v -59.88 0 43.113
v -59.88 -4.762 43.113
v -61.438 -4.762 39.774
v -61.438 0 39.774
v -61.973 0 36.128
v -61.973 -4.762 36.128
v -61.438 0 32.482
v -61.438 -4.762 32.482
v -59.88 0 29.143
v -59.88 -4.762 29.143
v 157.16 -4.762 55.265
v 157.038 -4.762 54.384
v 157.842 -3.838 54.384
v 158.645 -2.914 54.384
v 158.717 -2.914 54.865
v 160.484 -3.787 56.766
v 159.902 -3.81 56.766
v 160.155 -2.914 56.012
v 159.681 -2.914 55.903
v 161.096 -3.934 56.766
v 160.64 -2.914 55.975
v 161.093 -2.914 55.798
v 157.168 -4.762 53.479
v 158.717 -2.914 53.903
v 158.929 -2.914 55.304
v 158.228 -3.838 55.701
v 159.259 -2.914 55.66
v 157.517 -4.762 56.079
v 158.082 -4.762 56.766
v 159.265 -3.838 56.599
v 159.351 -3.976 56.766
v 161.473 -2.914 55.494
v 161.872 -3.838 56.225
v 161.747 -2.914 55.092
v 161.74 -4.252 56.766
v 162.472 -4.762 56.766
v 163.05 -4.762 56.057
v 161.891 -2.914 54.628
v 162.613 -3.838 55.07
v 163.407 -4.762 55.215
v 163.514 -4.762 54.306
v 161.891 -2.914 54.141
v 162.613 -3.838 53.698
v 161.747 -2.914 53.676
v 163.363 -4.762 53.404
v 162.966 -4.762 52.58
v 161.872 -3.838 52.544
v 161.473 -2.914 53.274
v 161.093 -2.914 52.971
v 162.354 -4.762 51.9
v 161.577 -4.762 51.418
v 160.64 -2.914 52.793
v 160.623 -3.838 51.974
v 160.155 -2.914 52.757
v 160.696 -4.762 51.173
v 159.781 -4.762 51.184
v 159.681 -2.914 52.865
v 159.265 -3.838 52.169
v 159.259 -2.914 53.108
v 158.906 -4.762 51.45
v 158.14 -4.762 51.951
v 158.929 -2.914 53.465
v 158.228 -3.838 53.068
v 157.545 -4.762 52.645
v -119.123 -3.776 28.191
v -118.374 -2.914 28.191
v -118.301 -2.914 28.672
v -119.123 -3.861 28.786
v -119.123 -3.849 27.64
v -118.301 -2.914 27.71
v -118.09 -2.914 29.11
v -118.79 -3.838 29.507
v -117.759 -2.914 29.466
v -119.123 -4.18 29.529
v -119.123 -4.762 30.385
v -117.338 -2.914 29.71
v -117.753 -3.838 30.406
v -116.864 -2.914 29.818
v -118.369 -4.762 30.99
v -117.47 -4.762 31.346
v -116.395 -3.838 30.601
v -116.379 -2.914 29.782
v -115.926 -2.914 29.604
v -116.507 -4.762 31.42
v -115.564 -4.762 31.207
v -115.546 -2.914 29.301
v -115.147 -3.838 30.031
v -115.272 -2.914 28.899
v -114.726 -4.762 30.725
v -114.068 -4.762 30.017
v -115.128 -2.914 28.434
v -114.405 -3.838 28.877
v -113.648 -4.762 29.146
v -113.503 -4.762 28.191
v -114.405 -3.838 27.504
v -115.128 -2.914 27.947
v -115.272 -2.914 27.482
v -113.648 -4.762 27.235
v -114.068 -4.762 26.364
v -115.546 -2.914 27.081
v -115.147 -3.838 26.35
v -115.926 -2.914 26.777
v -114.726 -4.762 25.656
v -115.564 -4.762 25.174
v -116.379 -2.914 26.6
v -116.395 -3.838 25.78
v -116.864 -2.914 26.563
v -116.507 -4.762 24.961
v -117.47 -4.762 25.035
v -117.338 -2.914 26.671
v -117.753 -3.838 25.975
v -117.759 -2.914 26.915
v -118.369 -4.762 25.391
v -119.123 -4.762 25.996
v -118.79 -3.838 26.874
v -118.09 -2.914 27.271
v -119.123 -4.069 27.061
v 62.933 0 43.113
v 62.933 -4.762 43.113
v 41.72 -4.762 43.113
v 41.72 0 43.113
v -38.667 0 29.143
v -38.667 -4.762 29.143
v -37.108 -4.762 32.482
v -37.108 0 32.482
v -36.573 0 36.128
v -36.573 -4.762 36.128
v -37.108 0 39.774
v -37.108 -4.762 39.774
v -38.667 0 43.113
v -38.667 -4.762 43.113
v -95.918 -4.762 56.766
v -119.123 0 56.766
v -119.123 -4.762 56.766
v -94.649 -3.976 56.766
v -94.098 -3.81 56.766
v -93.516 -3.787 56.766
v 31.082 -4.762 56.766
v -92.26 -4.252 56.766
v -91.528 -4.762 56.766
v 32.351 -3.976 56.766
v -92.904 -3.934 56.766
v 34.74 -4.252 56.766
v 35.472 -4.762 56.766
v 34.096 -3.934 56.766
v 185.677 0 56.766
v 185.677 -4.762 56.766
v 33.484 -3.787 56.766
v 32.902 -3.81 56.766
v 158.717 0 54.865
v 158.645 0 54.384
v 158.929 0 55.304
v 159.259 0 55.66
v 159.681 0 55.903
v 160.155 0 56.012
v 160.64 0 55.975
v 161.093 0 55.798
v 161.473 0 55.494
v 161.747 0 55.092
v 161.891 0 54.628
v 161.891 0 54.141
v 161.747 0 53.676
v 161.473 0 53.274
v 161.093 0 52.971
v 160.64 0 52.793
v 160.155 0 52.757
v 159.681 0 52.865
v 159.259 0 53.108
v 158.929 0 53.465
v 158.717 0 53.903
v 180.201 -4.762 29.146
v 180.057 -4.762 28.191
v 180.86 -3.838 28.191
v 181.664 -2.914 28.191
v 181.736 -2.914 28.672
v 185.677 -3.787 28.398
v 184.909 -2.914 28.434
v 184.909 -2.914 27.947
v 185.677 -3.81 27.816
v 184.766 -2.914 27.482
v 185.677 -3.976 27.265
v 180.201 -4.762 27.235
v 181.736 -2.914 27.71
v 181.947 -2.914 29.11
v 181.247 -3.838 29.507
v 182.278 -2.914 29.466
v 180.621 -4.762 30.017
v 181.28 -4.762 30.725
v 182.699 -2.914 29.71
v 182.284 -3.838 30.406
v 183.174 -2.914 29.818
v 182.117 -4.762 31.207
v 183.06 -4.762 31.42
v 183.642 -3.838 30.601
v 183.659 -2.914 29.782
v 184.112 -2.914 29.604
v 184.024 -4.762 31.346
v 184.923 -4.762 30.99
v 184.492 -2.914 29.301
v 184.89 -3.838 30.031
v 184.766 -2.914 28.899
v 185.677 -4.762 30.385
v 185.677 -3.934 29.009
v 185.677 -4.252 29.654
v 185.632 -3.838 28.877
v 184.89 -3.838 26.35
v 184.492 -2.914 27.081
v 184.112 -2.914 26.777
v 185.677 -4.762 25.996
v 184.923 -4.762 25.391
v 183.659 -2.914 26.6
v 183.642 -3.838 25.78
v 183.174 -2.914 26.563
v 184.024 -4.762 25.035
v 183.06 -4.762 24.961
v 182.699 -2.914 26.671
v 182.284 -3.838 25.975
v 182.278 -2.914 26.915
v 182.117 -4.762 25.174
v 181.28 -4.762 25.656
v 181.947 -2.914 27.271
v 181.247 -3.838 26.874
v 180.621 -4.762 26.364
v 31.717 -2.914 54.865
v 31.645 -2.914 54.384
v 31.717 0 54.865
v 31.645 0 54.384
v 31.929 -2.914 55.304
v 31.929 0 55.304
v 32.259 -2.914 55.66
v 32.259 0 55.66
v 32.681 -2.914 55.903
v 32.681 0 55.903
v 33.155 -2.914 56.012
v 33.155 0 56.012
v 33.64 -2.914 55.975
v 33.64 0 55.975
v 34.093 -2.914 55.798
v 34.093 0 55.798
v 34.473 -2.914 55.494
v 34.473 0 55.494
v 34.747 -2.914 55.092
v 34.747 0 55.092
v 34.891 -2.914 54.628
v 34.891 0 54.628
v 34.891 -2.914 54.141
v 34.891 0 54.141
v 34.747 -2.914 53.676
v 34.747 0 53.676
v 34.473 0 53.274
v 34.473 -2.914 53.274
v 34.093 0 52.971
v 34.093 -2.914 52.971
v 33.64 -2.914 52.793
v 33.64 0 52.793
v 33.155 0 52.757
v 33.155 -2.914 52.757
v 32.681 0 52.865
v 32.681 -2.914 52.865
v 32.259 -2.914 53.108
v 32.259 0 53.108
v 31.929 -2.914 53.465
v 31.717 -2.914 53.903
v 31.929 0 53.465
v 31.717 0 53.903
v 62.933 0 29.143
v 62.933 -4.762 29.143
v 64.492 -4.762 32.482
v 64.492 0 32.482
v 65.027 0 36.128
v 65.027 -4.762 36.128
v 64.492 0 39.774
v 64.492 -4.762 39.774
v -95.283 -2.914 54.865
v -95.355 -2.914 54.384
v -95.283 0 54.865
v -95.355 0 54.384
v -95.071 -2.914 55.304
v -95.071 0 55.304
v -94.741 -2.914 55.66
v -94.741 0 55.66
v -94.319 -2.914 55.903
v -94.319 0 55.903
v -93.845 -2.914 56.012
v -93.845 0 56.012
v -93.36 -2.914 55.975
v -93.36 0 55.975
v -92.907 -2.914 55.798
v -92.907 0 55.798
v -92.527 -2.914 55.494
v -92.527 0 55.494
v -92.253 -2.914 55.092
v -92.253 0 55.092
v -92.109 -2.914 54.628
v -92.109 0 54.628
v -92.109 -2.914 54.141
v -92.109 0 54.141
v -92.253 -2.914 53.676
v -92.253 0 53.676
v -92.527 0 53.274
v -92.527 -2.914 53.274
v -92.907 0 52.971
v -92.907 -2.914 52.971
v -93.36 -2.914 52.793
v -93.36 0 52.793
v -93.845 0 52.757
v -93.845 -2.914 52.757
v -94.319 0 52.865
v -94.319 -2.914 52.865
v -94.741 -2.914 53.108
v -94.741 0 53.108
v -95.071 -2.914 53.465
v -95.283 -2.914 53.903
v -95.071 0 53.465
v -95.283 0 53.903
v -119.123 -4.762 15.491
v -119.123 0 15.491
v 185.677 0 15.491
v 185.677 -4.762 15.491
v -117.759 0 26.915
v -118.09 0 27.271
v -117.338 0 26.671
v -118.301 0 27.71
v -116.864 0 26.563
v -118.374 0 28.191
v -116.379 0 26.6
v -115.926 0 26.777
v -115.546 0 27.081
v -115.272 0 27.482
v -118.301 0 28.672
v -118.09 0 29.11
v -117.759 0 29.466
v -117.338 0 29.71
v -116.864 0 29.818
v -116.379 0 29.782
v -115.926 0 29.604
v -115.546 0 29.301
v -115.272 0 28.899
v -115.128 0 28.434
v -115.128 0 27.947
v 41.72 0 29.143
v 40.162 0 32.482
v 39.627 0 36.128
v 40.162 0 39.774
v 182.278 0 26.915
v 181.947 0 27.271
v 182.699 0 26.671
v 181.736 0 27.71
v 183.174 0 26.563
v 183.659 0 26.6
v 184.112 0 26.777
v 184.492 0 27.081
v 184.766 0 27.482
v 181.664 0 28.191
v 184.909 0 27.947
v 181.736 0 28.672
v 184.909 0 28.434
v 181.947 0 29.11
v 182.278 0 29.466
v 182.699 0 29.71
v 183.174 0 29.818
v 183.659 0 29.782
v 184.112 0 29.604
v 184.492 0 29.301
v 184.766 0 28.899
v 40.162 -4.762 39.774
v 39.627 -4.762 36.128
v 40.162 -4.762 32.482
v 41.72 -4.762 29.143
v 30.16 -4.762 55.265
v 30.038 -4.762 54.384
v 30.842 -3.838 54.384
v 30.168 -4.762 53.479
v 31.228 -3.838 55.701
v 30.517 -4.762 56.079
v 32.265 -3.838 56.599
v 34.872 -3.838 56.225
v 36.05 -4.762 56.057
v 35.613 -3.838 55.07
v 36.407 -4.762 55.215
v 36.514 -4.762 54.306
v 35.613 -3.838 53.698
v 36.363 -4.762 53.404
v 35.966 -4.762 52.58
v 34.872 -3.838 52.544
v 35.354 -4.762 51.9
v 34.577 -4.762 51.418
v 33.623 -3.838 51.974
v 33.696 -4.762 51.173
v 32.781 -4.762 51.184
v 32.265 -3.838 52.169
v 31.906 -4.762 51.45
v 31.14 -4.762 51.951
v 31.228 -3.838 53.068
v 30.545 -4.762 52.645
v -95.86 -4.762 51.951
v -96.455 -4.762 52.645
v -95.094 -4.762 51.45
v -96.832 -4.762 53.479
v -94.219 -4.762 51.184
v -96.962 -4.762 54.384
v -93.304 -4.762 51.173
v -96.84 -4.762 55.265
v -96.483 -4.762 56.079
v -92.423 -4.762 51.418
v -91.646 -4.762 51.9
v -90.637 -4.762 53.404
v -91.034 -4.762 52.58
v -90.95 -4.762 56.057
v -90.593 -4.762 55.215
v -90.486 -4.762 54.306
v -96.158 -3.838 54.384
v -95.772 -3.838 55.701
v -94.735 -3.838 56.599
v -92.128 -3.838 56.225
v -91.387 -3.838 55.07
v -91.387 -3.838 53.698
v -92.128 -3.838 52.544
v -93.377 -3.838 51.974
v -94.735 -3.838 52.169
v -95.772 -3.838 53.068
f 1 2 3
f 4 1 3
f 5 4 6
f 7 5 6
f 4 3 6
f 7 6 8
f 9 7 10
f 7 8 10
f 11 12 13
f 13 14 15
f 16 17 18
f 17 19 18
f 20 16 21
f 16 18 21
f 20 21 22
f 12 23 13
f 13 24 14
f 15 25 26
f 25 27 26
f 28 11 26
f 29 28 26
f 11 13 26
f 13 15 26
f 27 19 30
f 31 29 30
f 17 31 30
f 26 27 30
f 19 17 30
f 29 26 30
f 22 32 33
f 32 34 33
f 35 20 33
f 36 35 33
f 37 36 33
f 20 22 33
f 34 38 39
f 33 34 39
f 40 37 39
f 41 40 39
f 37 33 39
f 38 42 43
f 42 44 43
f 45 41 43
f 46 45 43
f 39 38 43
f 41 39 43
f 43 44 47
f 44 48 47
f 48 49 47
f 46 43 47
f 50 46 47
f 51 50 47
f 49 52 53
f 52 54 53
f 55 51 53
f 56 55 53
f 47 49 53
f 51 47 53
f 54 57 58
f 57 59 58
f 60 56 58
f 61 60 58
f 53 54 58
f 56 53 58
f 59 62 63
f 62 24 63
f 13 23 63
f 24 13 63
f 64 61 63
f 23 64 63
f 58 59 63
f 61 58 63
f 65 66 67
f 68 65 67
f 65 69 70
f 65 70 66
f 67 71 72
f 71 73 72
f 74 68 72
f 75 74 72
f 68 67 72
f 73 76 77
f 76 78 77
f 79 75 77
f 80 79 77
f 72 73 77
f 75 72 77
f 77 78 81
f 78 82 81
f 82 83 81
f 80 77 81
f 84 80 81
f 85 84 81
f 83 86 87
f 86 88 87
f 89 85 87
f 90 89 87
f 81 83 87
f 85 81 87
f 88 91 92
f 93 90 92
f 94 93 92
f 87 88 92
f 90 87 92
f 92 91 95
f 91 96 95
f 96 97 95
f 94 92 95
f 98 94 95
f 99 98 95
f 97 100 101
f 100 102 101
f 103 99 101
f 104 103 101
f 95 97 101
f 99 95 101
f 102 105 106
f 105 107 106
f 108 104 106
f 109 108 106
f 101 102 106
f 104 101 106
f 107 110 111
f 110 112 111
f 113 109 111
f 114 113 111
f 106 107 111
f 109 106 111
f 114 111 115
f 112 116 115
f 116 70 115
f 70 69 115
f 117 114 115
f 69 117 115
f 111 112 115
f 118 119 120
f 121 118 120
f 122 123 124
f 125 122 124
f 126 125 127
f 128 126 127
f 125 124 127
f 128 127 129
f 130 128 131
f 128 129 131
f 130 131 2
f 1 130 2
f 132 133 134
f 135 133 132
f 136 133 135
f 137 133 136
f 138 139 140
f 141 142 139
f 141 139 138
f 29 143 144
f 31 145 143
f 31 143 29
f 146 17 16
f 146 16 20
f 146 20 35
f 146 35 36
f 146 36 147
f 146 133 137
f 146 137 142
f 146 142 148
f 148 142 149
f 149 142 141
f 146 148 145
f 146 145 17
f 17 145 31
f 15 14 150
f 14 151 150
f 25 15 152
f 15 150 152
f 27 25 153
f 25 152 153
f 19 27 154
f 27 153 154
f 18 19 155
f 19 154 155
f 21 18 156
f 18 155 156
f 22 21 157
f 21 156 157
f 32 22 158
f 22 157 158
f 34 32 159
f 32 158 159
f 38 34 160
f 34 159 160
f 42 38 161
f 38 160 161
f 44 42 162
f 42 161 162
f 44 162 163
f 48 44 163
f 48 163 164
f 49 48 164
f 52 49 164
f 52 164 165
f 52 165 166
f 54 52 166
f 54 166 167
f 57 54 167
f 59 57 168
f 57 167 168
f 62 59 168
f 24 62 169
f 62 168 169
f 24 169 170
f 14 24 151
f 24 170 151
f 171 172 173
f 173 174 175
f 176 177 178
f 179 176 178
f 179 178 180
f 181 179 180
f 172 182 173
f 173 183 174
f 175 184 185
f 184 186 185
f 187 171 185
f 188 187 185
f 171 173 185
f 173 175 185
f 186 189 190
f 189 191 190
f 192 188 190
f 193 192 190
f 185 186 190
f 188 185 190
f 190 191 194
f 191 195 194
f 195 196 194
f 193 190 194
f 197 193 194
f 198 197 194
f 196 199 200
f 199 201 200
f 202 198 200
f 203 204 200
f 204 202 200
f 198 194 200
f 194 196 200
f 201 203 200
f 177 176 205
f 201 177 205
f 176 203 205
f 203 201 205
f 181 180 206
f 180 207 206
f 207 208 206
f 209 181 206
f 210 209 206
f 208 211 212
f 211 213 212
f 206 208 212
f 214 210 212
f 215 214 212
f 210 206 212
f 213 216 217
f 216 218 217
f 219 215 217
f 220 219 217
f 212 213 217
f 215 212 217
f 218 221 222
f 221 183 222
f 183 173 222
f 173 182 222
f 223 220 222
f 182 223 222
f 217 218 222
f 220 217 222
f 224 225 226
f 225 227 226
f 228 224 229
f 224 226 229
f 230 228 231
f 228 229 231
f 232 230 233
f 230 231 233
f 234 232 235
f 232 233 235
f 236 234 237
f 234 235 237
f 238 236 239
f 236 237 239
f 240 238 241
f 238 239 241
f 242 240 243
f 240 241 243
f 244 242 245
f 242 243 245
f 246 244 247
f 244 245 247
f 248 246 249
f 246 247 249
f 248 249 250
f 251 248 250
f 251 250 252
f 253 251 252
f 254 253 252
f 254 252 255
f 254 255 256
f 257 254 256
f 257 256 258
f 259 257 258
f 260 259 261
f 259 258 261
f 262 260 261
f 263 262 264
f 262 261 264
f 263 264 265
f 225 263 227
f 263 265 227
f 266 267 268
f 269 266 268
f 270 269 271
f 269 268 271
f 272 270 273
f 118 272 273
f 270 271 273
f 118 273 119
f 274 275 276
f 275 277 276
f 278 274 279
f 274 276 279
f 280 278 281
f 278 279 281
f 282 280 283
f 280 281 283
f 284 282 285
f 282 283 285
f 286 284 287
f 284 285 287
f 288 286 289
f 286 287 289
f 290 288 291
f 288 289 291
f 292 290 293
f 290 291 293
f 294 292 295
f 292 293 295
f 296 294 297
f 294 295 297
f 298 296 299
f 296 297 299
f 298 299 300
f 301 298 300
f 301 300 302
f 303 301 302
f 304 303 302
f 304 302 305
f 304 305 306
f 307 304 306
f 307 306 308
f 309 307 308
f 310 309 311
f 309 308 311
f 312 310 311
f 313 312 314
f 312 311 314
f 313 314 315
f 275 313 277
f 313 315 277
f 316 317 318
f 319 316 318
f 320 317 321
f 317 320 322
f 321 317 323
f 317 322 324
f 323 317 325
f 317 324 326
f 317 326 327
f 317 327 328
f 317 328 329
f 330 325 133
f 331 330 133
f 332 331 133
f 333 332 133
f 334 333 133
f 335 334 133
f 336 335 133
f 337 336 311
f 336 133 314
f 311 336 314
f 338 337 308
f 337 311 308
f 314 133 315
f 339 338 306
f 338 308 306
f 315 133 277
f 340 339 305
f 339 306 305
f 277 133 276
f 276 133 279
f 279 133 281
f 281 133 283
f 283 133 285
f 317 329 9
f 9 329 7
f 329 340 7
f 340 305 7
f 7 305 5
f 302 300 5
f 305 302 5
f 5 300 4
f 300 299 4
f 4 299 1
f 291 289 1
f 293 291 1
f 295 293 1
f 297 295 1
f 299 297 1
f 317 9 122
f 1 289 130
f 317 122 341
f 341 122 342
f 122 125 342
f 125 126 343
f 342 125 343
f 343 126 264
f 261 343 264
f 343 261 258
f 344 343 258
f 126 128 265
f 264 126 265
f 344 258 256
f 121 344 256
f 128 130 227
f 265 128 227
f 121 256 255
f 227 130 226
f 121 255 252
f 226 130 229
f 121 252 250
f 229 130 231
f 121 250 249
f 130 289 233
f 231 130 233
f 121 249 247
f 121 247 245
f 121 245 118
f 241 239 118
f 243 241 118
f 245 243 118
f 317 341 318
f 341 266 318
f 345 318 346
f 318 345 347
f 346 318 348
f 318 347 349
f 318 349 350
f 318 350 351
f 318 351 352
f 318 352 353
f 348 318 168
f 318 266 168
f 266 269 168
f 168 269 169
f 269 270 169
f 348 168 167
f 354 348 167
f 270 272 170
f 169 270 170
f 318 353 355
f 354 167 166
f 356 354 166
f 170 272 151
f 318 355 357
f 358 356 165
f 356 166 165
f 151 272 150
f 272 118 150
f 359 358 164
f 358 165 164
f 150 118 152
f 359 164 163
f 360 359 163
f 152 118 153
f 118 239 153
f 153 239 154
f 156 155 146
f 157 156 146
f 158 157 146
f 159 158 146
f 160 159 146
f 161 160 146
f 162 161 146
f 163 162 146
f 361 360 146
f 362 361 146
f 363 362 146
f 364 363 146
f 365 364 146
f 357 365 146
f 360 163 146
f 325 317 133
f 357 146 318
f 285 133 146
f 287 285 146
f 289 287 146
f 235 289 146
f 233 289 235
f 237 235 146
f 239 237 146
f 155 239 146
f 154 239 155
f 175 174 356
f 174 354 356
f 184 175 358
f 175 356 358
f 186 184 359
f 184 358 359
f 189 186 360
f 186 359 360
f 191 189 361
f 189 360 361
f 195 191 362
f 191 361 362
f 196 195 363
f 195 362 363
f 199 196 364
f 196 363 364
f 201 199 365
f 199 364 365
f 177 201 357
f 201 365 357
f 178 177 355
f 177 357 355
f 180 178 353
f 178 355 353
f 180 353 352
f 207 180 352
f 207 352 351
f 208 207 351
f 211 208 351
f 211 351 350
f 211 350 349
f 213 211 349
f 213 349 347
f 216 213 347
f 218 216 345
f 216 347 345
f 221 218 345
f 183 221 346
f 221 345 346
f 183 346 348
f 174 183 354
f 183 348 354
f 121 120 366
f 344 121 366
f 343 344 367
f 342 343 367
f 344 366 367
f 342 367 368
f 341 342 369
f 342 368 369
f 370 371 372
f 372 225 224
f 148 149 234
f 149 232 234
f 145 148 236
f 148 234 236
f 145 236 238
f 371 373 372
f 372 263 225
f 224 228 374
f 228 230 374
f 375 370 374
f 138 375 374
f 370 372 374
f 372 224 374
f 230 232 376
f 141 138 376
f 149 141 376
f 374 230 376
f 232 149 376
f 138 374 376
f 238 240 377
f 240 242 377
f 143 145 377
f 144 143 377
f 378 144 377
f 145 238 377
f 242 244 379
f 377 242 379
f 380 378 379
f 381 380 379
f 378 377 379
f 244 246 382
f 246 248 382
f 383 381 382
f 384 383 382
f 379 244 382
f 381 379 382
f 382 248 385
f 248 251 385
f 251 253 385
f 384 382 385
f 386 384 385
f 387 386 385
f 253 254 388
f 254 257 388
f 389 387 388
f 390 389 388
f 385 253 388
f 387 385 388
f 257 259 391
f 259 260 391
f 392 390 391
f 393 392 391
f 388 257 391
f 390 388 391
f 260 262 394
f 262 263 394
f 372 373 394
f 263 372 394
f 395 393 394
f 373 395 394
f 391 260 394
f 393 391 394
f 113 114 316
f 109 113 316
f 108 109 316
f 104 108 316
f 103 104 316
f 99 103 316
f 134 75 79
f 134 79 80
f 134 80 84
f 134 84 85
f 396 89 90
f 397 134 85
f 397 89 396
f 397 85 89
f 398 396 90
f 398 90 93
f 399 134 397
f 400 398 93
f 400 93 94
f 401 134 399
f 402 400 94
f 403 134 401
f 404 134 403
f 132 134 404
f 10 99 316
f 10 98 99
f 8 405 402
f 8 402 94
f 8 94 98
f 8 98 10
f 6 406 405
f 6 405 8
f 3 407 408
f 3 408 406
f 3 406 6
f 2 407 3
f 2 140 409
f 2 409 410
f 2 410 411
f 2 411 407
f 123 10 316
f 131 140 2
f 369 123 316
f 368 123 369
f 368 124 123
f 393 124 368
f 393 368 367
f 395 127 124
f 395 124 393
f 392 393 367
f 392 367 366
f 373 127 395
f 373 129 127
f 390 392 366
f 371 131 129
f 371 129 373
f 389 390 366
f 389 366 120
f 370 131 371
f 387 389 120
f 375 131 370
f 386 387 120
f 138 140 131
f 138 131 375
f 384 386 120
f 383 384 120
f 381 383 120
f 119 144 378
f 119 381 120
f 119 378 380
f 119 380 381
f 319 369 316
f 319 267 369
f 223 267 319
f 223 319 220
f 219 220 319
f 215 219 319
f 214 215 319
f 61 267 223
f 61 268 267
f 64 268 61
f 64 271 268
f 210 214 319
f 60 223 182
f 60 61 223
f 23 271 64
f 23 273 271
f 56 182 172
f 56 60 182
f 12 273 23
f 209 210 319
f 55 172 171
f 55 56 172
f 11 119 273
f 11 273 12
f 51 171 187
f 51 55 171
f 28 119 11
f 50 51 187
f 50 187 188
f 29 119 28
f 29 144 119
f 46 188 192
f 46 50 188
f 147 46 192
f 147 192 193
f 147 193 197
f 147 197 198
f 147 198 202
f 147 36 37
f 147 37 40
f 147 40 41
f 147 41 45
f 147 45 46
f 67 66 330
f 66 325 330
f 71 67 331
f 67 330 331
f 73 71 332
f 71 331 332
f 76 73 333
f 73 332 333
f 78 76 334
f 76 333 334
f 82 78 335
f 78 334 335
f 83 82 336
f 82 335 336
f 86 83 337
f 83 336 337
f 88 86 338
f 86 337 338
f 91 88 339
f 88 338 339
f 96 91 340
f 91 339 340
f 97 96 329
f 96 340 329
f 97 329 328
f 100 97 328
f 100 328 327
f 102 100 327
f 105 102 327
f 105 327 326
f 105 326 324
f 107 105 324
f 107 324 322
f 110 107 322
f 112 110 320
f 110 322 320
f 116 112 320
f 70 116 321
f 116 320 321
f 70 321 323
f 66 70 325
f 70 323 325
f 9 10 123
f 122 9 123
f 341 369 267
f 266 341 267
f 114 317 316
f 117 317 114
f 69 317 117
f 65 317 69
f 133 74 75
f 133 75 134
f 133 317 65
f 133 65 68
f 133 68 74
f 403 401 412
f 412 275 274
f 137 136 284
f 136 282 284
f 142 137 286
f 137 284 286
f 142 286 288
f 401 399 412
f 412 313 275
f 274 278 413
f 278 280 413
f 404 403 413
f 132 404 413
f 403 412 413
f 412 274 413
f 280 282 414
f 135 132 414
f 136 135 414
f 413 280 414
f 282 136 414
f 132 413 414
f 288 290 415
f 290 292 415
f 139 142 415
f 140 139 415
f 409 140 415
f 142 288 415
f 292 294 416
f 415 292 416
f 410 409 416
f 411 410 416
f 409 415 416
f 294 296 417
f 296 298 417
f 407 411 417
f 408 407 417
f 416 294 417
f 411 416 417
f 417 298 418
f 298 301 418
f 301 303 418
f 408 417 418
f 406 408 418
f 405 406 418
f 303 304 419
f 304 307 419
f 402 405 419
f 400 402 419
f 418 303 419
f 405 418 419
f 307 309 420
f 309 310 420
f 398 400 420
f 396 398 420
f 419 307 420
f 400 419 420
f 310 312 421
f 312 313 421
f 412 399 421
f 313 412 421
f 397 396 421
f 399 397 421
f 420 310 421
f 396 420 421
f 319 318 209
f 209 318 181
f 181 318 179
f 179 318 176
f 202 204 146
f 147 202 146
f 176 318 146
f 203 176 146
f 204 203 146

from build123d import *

# Parameters (mm, degrees)
F0_W           = 304.8
F0_H           = 41.275
F1_DEPTH       = 4.7625
F3_D           = 3.2639
F3_DEPTH       = 14.605
F3_CSINK_D     = 6.477
F3_CSINK_ANGLE = 82
F3_TIP         = 0.9805744872
F5_DEPTH       = 25.4


with BuildPart() as f1:
    # F0 (on Front) → F1 (new body)
    with BuildSketch(Plane.XZ):
        with Locations((33.2768968371, 36.1280379981)):
            Rectangle(F0_W, F0_H)
    extrude(amount=F1_DEPTH)

    # F3
    with Locations(Plane.XZ.offset(4.7625)):
        with Locations((-93.7231031629, 54.3842879981), (-116.7418531629, 28.1905379981), (33.2768968371, 54.3842879981), (160.2768968371, 54.3842879981), (183.2956468371, 28.1905379981)):
            CounterSinkHole(F3_D / 2, F3_CSINK_D / 2, depth=F3_DEPTH, counter_sink_angle=F3_CSINK_ANGLE)
            with Locations((0, 0, -(F3_DEPTH + F3_TIP / 2))):  # 118° drill point
                Cone(0, F3_D / 2, F3_TIP, mode=Mode.SUBTRACT)

    # F4 (on face) → F5 (cut)
    with BuildSketch(Plane.XZ.offset(4.7625)):
        with BuildLine():
            Line((-38.6665120517, 43.1130379981), (-59.879694274, 43.1130379981))
            ThreePointArc((-59.879694274, 43.1130379981), (-61.9731031629, 36.1280379981), (-59.879694274, 29.1430379981))
            Line((-59.879694274, 29.1430379981), (-38.6665120517, 29.1430379981))
            ThreePointArc((-38.6665120517, 29.1430379981), (-36.5731031629, 36.1280379981), (-38.6665120517, 43.1130379981))
        make_face()
        with BuildLine():
            ThreePointArc((62.9334879483, 29.1430379981), (65.0268968371, 36.1280379981), (62.9334879483, 43.1130379981))
            Line((62.9334879483, 43.1130379981), (41.720305726, 43.1130379981))
            ThreePointArc((41.720305726, 43.1130379981), (39.6268968371, 36.1280379981), (41.720305726, 29.1430379981))
            Line((41.720305726, 29.1430379981), (62.9334879483, 29.1430379981))
        make_face()
    extrude(amount=-F5_DEPTH, mode=Mode.SUBTRACT)


solid = f1.part
